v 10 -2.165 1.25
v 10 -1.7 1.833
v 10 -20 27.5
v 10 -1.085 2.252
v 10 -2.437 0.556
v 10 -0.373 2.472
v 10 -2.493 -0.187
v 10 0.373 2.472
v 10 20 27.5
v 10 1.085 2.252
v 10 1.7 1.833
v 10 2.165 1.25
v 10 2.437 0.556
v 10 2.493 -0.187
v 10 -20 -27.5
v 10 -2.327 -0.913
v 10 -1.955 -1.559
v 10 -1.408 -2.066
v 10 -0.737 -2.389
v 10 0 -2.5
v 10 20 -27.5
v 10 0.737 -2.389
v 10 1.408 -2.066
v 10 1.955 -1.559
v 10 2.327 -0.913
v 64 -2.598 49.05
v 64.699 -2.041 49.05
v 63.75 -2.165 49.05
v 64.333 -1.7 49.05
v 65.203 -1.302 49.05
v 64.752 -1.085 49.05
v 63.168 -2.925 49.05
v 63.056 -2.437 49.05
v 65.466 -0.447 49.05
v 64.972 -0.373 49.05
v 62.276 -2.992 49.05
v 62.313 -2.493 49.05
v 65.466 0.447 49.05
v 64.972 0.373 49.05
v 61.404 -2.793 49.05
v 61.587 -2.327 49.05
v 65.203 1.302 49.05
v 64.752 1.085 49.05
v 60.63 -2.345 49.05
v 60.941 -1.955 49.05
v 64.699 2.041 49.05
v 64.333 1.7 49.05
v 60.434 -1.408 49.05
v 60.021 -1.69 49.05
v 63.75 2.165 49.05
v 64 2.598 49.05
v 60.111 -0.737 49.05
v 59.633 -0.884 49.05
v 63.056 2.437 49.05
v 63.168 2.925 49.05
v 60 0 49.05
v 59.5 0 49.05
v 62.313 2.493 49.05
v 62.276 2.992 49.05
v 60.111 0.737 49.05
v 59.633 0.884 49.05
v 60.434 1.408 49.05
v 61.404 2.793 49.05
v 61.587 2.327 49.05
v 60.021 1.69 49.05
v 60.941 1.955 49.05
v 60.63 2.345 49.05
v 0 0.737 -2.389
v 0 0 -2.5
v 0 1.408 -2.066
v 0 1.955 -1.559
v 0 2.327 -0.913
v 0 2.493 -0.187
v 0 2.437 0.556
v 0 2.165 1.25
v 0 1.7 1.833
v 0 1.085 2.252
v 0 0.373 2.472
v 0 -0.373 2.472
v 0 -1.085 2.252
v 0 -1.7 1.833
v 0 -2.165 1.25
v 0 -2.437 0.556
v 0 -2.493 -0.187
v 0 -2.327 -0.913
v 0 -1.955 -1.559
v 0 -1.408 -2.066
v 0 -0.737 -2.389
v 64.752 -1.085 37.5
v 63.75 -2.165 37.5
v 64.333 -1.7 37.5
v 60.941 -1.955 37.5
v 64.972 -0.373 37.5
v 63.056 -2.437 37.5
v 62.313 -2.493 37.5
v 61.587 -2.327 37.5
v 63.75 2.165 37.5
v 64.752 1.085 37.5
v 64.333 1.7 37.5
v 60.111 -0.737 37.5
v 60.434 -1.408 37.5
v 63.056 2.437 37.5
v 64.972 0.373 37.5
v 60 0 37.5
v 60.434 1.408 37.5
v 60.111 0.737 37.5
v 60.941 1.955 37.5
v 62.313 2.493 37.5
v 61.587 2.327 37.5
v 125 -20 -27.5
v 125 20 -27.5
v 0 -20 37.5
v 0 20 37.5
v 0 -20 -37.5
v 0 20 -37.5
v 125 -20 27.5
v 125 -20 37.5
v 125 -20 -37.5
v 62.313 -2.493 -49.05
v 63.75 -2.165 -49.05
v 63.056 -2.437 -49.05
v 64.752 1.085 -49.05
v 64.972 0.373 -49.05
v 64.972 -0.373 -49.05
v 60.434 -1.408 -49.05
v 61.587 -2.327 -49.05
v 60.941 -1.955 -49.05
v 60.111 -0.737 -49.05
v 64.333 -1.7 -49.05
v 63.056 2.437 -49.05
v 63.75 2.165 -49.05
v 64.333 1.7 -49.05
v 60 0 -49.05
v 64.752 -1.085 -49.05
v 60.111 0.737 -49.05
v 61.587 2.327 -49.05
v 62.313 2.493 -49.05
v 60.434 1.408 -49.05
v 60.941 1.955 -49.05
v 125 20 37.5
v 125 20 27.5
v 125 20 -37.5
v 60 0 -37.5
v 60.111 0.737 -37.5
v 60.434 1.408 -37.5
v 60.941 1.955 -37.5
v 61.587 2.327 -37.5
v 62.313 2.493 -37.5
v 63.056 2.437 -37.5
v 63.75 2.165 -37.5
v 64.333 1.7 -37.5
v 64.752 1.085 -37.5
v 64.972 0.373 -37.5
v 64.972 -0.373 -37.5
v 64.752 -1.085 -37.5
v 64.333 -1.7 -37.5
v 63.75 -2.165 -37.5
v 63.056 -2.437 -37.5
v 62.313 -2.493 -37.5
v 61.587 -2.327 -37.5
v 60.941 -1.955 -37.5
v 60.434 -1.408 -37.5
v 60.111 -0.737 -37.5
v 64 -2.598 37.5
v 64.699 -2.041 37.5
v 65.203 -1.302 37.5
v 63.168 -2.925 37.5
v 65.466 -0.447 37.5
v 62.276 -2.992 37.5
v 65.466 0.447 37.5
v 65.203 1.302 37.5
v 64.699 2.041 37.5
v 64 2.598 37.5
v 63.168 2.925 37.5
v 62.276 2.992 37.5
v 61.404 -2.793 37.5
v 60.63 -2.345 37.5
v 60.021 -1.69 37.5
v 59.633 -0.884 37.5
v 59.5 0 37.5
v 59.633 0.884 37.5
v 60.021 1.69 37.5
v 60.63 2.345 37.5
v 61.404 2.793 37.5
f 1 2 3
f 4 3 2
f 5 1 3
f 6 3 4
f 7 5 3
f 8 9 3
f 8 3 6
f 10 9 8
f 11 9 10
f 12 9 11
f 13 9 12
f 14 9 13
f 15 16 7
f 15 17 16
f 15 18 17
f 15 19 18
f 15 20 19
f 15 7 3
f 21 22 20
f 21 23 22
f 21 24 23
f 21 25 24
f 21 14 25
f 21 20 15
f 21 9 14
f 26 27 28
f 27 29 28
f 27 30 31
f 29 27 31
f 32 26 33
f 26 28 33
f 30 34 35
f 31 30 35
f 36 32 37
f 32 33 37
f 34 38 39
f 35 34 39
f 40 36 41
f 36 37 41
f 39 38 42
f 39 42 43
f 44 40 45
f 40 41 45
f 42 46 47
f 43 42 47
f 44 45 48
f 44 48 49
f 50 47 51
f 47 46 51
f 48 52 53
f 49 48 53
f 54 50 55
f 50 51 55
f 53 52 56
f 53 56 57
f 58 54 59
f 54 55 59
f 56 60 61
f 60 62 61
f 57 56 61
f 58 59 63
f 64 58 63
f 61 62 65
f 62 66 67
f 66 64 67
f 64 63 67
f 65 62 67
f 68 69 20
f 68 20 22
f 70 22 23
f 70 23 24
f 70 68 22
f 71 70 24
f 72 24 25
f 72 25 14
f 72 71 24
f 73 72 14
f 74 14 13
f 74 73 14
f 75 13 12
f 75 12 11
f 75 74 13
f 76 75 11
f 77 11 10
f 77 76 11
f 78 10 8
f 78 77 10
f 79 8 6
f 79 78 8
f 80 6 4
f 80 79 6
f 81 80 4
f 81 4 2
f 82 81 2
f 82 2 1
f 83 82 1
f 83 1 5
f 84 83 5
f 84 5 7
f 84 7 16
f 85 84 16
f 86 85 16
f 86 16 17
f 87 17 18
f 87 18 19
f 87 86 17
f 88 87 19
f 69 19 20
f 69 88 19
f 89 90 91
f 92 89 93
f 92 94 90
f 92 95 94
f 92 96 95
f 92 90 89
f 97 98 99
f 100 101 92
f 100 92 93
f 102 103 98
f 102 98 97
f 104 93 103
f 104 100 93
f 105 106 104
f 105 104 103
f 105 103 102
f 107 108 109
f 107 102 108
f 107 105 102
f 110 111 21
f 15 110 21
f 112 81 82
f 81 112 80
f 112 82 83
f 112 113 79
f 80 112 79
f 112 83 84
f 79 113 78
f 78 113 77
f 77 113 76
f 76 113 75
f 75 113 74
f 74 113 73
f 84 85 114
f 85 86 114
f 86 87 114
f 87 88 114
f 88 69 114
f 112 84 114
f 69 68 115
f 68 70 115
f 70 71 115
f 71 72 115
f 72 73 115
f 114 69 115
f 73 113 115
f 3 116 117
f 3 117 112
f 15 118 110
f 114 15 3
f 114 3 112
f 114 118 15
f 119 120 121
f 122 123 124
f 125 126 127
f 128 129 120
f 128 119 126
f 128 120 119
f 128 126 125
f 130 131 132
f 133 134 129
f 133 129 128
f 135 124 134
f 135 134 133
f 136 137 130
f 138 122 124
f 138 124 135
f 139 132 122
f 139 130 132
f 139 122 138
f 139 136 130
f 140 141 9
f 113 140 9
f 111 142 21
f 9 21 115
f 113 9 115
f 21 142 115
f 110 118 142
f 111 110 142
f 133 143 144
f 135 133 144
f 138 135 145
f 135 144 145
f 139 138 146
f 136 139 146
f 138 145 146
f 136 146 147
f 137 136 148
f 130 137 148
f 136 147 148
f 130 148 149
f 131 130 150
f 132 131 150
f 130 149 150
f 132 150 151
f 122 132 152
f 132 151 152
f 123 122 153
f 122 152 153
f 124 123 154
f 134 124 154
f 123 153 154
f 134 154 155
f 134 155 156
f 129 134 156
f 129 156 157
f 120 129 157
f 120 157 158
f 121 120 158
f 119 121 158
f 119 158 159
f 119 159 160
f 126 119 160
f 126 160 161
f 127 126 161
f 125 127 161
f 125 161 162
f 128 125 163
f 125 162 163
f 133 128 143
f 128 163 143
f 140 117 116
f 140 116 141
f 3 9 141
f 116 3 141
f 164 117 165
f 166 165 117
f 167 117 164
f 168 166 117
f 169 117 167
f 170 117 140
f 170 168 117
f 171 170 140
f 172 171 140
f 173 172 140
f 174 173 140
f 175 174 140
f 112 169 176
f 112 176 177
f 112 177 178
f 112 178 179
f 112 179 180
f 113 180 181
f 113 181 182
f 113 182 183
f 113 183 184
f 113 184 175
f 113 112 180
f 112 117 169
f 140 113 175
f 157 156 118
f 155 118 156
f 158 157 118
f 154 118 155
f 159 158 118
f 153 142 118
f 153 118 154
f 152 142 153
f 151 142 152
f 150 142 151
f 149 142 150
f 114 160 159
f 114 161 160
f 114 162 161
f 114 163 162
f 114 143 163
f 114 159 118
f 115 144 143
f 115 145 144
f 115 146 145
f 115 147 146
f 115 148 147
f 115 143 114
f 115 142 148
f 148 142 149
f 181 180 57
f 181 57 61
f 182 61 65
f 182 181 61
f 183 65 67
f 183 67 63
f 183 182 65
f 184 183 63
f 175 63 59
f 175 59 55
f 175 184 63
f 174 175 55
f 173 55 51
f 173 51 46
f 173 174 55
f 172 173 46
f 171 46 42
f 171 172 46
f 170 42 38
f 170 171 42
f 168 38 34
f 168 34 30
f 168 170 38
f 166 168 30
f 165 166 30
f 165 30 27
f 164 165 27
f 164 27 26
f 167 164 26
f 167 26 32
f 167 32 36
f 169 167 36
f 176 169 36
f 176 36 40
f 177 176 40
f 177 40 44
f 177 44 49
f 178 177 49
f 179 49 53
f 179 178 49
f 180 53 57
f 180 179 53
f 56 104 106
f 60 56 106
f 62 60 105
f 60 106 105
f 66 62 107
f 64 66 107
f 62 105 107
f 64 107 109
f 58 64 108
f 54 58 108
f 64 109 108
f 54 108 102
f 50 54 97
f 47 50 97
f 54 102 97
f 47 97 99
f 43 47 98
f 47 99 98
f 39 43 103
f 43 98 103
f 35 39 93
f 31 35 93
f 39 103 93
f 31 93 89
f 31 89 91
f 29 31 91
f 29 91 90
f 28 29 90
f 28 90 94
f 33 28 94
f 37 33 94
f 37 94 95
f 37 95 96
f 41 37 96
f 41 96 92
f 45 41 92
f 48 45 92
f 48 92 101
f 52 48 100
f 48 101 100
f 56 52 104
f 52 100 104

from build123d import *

# Parameters (mm, degrees)
SKETCH5_W            = 75
SKETCH5_H            = 40
SKETCH5_R            = 2.5
BOSS_EXTRUDE6_DEPTH  = 10
SKETCH6_W            = 125
SKETCH6_H            = 40
BOSS_EXTRUDE7_DEPTH  = 10
SKETCH7_W            = 125
SKETCH7_H            = 40
BOSS_EXTRUDE8_DEPTH  = 10
SKETCH8_R            = 2.5
BOSS_EXTRUDE9_DEPTH  = 11.55
SKETCH10_R           = 3
SKETCH10_R_2         = 2.5
BOSS_EXTRUDE10_DEPTH = 11.55


with BuildPart() as part:
    # Sketch5 → Boss-Extrude6 (new body)
    with BuildSketch(Plane(origin=(0, 0, 0), x_dir=(0, 0, -1), z_dir=(1, 0, 0))):
        Rectangle(SKETCH5_W, SKETCH5_H)
        Circle(SKETCH5_R, mode=Mode.SUBTRACT)
    extrude(amount=BOSS_EXTRUDE6_DEPTH)

    # Sketch6 → Boss-Extrude7 (add)
    with BuildSketch(Plane(origin=(0, 0, -37.5), x_dir=(-1, 0, 0), z_dir=(0, 0, -1))):
        with Locations((-62.5, 0)):
            Rectangle(SKETCH6_W, SKETCH6_H)
    extrude(amount=-BOSS_EXTRUDE7_DEPTH)

    # Sketch7 → Boss-Extrude8 (add)
    with BuildSketch(Plane.XY.offset(37.5)):
        with Locations((62.5, 0)):
            Rectangle(SKETCH7_W, SKETCH7_H)
    extrude(amount=-BOSS_EXTRUDE8_DEPTH)

    # Sketch8 → Boss-Extrude9 (add)
    with BuildSketch(Plane(origin=(0, 0, -37.5), x_dir=(-1, 0, 0), z_dir=(0, 0, -1))):
        with Locations((-62.5, 0)):
            Circle(SKETCH8_R)
    extrude(amount=BOSS_EXTRUDE9_DEPTH)

    # Sketch10 → Boss-Extrude10 (add)
    with BuildSketch(Plane(origin=(0, 0, 37.5), x_dir=(-1, 0, 0), z_dir=(0, 0, -1))):
        with Locations((-62.5, 0)):
            Circle(SKETCH10_R)
        with Locations((-62.5, 0)):
            Circle(SKETCH10_R_2, mode=Mode.SUBTRACT)
    extrude(amount=-BOSS_EXTRUDE10_DEPTH)


solid = part.part
